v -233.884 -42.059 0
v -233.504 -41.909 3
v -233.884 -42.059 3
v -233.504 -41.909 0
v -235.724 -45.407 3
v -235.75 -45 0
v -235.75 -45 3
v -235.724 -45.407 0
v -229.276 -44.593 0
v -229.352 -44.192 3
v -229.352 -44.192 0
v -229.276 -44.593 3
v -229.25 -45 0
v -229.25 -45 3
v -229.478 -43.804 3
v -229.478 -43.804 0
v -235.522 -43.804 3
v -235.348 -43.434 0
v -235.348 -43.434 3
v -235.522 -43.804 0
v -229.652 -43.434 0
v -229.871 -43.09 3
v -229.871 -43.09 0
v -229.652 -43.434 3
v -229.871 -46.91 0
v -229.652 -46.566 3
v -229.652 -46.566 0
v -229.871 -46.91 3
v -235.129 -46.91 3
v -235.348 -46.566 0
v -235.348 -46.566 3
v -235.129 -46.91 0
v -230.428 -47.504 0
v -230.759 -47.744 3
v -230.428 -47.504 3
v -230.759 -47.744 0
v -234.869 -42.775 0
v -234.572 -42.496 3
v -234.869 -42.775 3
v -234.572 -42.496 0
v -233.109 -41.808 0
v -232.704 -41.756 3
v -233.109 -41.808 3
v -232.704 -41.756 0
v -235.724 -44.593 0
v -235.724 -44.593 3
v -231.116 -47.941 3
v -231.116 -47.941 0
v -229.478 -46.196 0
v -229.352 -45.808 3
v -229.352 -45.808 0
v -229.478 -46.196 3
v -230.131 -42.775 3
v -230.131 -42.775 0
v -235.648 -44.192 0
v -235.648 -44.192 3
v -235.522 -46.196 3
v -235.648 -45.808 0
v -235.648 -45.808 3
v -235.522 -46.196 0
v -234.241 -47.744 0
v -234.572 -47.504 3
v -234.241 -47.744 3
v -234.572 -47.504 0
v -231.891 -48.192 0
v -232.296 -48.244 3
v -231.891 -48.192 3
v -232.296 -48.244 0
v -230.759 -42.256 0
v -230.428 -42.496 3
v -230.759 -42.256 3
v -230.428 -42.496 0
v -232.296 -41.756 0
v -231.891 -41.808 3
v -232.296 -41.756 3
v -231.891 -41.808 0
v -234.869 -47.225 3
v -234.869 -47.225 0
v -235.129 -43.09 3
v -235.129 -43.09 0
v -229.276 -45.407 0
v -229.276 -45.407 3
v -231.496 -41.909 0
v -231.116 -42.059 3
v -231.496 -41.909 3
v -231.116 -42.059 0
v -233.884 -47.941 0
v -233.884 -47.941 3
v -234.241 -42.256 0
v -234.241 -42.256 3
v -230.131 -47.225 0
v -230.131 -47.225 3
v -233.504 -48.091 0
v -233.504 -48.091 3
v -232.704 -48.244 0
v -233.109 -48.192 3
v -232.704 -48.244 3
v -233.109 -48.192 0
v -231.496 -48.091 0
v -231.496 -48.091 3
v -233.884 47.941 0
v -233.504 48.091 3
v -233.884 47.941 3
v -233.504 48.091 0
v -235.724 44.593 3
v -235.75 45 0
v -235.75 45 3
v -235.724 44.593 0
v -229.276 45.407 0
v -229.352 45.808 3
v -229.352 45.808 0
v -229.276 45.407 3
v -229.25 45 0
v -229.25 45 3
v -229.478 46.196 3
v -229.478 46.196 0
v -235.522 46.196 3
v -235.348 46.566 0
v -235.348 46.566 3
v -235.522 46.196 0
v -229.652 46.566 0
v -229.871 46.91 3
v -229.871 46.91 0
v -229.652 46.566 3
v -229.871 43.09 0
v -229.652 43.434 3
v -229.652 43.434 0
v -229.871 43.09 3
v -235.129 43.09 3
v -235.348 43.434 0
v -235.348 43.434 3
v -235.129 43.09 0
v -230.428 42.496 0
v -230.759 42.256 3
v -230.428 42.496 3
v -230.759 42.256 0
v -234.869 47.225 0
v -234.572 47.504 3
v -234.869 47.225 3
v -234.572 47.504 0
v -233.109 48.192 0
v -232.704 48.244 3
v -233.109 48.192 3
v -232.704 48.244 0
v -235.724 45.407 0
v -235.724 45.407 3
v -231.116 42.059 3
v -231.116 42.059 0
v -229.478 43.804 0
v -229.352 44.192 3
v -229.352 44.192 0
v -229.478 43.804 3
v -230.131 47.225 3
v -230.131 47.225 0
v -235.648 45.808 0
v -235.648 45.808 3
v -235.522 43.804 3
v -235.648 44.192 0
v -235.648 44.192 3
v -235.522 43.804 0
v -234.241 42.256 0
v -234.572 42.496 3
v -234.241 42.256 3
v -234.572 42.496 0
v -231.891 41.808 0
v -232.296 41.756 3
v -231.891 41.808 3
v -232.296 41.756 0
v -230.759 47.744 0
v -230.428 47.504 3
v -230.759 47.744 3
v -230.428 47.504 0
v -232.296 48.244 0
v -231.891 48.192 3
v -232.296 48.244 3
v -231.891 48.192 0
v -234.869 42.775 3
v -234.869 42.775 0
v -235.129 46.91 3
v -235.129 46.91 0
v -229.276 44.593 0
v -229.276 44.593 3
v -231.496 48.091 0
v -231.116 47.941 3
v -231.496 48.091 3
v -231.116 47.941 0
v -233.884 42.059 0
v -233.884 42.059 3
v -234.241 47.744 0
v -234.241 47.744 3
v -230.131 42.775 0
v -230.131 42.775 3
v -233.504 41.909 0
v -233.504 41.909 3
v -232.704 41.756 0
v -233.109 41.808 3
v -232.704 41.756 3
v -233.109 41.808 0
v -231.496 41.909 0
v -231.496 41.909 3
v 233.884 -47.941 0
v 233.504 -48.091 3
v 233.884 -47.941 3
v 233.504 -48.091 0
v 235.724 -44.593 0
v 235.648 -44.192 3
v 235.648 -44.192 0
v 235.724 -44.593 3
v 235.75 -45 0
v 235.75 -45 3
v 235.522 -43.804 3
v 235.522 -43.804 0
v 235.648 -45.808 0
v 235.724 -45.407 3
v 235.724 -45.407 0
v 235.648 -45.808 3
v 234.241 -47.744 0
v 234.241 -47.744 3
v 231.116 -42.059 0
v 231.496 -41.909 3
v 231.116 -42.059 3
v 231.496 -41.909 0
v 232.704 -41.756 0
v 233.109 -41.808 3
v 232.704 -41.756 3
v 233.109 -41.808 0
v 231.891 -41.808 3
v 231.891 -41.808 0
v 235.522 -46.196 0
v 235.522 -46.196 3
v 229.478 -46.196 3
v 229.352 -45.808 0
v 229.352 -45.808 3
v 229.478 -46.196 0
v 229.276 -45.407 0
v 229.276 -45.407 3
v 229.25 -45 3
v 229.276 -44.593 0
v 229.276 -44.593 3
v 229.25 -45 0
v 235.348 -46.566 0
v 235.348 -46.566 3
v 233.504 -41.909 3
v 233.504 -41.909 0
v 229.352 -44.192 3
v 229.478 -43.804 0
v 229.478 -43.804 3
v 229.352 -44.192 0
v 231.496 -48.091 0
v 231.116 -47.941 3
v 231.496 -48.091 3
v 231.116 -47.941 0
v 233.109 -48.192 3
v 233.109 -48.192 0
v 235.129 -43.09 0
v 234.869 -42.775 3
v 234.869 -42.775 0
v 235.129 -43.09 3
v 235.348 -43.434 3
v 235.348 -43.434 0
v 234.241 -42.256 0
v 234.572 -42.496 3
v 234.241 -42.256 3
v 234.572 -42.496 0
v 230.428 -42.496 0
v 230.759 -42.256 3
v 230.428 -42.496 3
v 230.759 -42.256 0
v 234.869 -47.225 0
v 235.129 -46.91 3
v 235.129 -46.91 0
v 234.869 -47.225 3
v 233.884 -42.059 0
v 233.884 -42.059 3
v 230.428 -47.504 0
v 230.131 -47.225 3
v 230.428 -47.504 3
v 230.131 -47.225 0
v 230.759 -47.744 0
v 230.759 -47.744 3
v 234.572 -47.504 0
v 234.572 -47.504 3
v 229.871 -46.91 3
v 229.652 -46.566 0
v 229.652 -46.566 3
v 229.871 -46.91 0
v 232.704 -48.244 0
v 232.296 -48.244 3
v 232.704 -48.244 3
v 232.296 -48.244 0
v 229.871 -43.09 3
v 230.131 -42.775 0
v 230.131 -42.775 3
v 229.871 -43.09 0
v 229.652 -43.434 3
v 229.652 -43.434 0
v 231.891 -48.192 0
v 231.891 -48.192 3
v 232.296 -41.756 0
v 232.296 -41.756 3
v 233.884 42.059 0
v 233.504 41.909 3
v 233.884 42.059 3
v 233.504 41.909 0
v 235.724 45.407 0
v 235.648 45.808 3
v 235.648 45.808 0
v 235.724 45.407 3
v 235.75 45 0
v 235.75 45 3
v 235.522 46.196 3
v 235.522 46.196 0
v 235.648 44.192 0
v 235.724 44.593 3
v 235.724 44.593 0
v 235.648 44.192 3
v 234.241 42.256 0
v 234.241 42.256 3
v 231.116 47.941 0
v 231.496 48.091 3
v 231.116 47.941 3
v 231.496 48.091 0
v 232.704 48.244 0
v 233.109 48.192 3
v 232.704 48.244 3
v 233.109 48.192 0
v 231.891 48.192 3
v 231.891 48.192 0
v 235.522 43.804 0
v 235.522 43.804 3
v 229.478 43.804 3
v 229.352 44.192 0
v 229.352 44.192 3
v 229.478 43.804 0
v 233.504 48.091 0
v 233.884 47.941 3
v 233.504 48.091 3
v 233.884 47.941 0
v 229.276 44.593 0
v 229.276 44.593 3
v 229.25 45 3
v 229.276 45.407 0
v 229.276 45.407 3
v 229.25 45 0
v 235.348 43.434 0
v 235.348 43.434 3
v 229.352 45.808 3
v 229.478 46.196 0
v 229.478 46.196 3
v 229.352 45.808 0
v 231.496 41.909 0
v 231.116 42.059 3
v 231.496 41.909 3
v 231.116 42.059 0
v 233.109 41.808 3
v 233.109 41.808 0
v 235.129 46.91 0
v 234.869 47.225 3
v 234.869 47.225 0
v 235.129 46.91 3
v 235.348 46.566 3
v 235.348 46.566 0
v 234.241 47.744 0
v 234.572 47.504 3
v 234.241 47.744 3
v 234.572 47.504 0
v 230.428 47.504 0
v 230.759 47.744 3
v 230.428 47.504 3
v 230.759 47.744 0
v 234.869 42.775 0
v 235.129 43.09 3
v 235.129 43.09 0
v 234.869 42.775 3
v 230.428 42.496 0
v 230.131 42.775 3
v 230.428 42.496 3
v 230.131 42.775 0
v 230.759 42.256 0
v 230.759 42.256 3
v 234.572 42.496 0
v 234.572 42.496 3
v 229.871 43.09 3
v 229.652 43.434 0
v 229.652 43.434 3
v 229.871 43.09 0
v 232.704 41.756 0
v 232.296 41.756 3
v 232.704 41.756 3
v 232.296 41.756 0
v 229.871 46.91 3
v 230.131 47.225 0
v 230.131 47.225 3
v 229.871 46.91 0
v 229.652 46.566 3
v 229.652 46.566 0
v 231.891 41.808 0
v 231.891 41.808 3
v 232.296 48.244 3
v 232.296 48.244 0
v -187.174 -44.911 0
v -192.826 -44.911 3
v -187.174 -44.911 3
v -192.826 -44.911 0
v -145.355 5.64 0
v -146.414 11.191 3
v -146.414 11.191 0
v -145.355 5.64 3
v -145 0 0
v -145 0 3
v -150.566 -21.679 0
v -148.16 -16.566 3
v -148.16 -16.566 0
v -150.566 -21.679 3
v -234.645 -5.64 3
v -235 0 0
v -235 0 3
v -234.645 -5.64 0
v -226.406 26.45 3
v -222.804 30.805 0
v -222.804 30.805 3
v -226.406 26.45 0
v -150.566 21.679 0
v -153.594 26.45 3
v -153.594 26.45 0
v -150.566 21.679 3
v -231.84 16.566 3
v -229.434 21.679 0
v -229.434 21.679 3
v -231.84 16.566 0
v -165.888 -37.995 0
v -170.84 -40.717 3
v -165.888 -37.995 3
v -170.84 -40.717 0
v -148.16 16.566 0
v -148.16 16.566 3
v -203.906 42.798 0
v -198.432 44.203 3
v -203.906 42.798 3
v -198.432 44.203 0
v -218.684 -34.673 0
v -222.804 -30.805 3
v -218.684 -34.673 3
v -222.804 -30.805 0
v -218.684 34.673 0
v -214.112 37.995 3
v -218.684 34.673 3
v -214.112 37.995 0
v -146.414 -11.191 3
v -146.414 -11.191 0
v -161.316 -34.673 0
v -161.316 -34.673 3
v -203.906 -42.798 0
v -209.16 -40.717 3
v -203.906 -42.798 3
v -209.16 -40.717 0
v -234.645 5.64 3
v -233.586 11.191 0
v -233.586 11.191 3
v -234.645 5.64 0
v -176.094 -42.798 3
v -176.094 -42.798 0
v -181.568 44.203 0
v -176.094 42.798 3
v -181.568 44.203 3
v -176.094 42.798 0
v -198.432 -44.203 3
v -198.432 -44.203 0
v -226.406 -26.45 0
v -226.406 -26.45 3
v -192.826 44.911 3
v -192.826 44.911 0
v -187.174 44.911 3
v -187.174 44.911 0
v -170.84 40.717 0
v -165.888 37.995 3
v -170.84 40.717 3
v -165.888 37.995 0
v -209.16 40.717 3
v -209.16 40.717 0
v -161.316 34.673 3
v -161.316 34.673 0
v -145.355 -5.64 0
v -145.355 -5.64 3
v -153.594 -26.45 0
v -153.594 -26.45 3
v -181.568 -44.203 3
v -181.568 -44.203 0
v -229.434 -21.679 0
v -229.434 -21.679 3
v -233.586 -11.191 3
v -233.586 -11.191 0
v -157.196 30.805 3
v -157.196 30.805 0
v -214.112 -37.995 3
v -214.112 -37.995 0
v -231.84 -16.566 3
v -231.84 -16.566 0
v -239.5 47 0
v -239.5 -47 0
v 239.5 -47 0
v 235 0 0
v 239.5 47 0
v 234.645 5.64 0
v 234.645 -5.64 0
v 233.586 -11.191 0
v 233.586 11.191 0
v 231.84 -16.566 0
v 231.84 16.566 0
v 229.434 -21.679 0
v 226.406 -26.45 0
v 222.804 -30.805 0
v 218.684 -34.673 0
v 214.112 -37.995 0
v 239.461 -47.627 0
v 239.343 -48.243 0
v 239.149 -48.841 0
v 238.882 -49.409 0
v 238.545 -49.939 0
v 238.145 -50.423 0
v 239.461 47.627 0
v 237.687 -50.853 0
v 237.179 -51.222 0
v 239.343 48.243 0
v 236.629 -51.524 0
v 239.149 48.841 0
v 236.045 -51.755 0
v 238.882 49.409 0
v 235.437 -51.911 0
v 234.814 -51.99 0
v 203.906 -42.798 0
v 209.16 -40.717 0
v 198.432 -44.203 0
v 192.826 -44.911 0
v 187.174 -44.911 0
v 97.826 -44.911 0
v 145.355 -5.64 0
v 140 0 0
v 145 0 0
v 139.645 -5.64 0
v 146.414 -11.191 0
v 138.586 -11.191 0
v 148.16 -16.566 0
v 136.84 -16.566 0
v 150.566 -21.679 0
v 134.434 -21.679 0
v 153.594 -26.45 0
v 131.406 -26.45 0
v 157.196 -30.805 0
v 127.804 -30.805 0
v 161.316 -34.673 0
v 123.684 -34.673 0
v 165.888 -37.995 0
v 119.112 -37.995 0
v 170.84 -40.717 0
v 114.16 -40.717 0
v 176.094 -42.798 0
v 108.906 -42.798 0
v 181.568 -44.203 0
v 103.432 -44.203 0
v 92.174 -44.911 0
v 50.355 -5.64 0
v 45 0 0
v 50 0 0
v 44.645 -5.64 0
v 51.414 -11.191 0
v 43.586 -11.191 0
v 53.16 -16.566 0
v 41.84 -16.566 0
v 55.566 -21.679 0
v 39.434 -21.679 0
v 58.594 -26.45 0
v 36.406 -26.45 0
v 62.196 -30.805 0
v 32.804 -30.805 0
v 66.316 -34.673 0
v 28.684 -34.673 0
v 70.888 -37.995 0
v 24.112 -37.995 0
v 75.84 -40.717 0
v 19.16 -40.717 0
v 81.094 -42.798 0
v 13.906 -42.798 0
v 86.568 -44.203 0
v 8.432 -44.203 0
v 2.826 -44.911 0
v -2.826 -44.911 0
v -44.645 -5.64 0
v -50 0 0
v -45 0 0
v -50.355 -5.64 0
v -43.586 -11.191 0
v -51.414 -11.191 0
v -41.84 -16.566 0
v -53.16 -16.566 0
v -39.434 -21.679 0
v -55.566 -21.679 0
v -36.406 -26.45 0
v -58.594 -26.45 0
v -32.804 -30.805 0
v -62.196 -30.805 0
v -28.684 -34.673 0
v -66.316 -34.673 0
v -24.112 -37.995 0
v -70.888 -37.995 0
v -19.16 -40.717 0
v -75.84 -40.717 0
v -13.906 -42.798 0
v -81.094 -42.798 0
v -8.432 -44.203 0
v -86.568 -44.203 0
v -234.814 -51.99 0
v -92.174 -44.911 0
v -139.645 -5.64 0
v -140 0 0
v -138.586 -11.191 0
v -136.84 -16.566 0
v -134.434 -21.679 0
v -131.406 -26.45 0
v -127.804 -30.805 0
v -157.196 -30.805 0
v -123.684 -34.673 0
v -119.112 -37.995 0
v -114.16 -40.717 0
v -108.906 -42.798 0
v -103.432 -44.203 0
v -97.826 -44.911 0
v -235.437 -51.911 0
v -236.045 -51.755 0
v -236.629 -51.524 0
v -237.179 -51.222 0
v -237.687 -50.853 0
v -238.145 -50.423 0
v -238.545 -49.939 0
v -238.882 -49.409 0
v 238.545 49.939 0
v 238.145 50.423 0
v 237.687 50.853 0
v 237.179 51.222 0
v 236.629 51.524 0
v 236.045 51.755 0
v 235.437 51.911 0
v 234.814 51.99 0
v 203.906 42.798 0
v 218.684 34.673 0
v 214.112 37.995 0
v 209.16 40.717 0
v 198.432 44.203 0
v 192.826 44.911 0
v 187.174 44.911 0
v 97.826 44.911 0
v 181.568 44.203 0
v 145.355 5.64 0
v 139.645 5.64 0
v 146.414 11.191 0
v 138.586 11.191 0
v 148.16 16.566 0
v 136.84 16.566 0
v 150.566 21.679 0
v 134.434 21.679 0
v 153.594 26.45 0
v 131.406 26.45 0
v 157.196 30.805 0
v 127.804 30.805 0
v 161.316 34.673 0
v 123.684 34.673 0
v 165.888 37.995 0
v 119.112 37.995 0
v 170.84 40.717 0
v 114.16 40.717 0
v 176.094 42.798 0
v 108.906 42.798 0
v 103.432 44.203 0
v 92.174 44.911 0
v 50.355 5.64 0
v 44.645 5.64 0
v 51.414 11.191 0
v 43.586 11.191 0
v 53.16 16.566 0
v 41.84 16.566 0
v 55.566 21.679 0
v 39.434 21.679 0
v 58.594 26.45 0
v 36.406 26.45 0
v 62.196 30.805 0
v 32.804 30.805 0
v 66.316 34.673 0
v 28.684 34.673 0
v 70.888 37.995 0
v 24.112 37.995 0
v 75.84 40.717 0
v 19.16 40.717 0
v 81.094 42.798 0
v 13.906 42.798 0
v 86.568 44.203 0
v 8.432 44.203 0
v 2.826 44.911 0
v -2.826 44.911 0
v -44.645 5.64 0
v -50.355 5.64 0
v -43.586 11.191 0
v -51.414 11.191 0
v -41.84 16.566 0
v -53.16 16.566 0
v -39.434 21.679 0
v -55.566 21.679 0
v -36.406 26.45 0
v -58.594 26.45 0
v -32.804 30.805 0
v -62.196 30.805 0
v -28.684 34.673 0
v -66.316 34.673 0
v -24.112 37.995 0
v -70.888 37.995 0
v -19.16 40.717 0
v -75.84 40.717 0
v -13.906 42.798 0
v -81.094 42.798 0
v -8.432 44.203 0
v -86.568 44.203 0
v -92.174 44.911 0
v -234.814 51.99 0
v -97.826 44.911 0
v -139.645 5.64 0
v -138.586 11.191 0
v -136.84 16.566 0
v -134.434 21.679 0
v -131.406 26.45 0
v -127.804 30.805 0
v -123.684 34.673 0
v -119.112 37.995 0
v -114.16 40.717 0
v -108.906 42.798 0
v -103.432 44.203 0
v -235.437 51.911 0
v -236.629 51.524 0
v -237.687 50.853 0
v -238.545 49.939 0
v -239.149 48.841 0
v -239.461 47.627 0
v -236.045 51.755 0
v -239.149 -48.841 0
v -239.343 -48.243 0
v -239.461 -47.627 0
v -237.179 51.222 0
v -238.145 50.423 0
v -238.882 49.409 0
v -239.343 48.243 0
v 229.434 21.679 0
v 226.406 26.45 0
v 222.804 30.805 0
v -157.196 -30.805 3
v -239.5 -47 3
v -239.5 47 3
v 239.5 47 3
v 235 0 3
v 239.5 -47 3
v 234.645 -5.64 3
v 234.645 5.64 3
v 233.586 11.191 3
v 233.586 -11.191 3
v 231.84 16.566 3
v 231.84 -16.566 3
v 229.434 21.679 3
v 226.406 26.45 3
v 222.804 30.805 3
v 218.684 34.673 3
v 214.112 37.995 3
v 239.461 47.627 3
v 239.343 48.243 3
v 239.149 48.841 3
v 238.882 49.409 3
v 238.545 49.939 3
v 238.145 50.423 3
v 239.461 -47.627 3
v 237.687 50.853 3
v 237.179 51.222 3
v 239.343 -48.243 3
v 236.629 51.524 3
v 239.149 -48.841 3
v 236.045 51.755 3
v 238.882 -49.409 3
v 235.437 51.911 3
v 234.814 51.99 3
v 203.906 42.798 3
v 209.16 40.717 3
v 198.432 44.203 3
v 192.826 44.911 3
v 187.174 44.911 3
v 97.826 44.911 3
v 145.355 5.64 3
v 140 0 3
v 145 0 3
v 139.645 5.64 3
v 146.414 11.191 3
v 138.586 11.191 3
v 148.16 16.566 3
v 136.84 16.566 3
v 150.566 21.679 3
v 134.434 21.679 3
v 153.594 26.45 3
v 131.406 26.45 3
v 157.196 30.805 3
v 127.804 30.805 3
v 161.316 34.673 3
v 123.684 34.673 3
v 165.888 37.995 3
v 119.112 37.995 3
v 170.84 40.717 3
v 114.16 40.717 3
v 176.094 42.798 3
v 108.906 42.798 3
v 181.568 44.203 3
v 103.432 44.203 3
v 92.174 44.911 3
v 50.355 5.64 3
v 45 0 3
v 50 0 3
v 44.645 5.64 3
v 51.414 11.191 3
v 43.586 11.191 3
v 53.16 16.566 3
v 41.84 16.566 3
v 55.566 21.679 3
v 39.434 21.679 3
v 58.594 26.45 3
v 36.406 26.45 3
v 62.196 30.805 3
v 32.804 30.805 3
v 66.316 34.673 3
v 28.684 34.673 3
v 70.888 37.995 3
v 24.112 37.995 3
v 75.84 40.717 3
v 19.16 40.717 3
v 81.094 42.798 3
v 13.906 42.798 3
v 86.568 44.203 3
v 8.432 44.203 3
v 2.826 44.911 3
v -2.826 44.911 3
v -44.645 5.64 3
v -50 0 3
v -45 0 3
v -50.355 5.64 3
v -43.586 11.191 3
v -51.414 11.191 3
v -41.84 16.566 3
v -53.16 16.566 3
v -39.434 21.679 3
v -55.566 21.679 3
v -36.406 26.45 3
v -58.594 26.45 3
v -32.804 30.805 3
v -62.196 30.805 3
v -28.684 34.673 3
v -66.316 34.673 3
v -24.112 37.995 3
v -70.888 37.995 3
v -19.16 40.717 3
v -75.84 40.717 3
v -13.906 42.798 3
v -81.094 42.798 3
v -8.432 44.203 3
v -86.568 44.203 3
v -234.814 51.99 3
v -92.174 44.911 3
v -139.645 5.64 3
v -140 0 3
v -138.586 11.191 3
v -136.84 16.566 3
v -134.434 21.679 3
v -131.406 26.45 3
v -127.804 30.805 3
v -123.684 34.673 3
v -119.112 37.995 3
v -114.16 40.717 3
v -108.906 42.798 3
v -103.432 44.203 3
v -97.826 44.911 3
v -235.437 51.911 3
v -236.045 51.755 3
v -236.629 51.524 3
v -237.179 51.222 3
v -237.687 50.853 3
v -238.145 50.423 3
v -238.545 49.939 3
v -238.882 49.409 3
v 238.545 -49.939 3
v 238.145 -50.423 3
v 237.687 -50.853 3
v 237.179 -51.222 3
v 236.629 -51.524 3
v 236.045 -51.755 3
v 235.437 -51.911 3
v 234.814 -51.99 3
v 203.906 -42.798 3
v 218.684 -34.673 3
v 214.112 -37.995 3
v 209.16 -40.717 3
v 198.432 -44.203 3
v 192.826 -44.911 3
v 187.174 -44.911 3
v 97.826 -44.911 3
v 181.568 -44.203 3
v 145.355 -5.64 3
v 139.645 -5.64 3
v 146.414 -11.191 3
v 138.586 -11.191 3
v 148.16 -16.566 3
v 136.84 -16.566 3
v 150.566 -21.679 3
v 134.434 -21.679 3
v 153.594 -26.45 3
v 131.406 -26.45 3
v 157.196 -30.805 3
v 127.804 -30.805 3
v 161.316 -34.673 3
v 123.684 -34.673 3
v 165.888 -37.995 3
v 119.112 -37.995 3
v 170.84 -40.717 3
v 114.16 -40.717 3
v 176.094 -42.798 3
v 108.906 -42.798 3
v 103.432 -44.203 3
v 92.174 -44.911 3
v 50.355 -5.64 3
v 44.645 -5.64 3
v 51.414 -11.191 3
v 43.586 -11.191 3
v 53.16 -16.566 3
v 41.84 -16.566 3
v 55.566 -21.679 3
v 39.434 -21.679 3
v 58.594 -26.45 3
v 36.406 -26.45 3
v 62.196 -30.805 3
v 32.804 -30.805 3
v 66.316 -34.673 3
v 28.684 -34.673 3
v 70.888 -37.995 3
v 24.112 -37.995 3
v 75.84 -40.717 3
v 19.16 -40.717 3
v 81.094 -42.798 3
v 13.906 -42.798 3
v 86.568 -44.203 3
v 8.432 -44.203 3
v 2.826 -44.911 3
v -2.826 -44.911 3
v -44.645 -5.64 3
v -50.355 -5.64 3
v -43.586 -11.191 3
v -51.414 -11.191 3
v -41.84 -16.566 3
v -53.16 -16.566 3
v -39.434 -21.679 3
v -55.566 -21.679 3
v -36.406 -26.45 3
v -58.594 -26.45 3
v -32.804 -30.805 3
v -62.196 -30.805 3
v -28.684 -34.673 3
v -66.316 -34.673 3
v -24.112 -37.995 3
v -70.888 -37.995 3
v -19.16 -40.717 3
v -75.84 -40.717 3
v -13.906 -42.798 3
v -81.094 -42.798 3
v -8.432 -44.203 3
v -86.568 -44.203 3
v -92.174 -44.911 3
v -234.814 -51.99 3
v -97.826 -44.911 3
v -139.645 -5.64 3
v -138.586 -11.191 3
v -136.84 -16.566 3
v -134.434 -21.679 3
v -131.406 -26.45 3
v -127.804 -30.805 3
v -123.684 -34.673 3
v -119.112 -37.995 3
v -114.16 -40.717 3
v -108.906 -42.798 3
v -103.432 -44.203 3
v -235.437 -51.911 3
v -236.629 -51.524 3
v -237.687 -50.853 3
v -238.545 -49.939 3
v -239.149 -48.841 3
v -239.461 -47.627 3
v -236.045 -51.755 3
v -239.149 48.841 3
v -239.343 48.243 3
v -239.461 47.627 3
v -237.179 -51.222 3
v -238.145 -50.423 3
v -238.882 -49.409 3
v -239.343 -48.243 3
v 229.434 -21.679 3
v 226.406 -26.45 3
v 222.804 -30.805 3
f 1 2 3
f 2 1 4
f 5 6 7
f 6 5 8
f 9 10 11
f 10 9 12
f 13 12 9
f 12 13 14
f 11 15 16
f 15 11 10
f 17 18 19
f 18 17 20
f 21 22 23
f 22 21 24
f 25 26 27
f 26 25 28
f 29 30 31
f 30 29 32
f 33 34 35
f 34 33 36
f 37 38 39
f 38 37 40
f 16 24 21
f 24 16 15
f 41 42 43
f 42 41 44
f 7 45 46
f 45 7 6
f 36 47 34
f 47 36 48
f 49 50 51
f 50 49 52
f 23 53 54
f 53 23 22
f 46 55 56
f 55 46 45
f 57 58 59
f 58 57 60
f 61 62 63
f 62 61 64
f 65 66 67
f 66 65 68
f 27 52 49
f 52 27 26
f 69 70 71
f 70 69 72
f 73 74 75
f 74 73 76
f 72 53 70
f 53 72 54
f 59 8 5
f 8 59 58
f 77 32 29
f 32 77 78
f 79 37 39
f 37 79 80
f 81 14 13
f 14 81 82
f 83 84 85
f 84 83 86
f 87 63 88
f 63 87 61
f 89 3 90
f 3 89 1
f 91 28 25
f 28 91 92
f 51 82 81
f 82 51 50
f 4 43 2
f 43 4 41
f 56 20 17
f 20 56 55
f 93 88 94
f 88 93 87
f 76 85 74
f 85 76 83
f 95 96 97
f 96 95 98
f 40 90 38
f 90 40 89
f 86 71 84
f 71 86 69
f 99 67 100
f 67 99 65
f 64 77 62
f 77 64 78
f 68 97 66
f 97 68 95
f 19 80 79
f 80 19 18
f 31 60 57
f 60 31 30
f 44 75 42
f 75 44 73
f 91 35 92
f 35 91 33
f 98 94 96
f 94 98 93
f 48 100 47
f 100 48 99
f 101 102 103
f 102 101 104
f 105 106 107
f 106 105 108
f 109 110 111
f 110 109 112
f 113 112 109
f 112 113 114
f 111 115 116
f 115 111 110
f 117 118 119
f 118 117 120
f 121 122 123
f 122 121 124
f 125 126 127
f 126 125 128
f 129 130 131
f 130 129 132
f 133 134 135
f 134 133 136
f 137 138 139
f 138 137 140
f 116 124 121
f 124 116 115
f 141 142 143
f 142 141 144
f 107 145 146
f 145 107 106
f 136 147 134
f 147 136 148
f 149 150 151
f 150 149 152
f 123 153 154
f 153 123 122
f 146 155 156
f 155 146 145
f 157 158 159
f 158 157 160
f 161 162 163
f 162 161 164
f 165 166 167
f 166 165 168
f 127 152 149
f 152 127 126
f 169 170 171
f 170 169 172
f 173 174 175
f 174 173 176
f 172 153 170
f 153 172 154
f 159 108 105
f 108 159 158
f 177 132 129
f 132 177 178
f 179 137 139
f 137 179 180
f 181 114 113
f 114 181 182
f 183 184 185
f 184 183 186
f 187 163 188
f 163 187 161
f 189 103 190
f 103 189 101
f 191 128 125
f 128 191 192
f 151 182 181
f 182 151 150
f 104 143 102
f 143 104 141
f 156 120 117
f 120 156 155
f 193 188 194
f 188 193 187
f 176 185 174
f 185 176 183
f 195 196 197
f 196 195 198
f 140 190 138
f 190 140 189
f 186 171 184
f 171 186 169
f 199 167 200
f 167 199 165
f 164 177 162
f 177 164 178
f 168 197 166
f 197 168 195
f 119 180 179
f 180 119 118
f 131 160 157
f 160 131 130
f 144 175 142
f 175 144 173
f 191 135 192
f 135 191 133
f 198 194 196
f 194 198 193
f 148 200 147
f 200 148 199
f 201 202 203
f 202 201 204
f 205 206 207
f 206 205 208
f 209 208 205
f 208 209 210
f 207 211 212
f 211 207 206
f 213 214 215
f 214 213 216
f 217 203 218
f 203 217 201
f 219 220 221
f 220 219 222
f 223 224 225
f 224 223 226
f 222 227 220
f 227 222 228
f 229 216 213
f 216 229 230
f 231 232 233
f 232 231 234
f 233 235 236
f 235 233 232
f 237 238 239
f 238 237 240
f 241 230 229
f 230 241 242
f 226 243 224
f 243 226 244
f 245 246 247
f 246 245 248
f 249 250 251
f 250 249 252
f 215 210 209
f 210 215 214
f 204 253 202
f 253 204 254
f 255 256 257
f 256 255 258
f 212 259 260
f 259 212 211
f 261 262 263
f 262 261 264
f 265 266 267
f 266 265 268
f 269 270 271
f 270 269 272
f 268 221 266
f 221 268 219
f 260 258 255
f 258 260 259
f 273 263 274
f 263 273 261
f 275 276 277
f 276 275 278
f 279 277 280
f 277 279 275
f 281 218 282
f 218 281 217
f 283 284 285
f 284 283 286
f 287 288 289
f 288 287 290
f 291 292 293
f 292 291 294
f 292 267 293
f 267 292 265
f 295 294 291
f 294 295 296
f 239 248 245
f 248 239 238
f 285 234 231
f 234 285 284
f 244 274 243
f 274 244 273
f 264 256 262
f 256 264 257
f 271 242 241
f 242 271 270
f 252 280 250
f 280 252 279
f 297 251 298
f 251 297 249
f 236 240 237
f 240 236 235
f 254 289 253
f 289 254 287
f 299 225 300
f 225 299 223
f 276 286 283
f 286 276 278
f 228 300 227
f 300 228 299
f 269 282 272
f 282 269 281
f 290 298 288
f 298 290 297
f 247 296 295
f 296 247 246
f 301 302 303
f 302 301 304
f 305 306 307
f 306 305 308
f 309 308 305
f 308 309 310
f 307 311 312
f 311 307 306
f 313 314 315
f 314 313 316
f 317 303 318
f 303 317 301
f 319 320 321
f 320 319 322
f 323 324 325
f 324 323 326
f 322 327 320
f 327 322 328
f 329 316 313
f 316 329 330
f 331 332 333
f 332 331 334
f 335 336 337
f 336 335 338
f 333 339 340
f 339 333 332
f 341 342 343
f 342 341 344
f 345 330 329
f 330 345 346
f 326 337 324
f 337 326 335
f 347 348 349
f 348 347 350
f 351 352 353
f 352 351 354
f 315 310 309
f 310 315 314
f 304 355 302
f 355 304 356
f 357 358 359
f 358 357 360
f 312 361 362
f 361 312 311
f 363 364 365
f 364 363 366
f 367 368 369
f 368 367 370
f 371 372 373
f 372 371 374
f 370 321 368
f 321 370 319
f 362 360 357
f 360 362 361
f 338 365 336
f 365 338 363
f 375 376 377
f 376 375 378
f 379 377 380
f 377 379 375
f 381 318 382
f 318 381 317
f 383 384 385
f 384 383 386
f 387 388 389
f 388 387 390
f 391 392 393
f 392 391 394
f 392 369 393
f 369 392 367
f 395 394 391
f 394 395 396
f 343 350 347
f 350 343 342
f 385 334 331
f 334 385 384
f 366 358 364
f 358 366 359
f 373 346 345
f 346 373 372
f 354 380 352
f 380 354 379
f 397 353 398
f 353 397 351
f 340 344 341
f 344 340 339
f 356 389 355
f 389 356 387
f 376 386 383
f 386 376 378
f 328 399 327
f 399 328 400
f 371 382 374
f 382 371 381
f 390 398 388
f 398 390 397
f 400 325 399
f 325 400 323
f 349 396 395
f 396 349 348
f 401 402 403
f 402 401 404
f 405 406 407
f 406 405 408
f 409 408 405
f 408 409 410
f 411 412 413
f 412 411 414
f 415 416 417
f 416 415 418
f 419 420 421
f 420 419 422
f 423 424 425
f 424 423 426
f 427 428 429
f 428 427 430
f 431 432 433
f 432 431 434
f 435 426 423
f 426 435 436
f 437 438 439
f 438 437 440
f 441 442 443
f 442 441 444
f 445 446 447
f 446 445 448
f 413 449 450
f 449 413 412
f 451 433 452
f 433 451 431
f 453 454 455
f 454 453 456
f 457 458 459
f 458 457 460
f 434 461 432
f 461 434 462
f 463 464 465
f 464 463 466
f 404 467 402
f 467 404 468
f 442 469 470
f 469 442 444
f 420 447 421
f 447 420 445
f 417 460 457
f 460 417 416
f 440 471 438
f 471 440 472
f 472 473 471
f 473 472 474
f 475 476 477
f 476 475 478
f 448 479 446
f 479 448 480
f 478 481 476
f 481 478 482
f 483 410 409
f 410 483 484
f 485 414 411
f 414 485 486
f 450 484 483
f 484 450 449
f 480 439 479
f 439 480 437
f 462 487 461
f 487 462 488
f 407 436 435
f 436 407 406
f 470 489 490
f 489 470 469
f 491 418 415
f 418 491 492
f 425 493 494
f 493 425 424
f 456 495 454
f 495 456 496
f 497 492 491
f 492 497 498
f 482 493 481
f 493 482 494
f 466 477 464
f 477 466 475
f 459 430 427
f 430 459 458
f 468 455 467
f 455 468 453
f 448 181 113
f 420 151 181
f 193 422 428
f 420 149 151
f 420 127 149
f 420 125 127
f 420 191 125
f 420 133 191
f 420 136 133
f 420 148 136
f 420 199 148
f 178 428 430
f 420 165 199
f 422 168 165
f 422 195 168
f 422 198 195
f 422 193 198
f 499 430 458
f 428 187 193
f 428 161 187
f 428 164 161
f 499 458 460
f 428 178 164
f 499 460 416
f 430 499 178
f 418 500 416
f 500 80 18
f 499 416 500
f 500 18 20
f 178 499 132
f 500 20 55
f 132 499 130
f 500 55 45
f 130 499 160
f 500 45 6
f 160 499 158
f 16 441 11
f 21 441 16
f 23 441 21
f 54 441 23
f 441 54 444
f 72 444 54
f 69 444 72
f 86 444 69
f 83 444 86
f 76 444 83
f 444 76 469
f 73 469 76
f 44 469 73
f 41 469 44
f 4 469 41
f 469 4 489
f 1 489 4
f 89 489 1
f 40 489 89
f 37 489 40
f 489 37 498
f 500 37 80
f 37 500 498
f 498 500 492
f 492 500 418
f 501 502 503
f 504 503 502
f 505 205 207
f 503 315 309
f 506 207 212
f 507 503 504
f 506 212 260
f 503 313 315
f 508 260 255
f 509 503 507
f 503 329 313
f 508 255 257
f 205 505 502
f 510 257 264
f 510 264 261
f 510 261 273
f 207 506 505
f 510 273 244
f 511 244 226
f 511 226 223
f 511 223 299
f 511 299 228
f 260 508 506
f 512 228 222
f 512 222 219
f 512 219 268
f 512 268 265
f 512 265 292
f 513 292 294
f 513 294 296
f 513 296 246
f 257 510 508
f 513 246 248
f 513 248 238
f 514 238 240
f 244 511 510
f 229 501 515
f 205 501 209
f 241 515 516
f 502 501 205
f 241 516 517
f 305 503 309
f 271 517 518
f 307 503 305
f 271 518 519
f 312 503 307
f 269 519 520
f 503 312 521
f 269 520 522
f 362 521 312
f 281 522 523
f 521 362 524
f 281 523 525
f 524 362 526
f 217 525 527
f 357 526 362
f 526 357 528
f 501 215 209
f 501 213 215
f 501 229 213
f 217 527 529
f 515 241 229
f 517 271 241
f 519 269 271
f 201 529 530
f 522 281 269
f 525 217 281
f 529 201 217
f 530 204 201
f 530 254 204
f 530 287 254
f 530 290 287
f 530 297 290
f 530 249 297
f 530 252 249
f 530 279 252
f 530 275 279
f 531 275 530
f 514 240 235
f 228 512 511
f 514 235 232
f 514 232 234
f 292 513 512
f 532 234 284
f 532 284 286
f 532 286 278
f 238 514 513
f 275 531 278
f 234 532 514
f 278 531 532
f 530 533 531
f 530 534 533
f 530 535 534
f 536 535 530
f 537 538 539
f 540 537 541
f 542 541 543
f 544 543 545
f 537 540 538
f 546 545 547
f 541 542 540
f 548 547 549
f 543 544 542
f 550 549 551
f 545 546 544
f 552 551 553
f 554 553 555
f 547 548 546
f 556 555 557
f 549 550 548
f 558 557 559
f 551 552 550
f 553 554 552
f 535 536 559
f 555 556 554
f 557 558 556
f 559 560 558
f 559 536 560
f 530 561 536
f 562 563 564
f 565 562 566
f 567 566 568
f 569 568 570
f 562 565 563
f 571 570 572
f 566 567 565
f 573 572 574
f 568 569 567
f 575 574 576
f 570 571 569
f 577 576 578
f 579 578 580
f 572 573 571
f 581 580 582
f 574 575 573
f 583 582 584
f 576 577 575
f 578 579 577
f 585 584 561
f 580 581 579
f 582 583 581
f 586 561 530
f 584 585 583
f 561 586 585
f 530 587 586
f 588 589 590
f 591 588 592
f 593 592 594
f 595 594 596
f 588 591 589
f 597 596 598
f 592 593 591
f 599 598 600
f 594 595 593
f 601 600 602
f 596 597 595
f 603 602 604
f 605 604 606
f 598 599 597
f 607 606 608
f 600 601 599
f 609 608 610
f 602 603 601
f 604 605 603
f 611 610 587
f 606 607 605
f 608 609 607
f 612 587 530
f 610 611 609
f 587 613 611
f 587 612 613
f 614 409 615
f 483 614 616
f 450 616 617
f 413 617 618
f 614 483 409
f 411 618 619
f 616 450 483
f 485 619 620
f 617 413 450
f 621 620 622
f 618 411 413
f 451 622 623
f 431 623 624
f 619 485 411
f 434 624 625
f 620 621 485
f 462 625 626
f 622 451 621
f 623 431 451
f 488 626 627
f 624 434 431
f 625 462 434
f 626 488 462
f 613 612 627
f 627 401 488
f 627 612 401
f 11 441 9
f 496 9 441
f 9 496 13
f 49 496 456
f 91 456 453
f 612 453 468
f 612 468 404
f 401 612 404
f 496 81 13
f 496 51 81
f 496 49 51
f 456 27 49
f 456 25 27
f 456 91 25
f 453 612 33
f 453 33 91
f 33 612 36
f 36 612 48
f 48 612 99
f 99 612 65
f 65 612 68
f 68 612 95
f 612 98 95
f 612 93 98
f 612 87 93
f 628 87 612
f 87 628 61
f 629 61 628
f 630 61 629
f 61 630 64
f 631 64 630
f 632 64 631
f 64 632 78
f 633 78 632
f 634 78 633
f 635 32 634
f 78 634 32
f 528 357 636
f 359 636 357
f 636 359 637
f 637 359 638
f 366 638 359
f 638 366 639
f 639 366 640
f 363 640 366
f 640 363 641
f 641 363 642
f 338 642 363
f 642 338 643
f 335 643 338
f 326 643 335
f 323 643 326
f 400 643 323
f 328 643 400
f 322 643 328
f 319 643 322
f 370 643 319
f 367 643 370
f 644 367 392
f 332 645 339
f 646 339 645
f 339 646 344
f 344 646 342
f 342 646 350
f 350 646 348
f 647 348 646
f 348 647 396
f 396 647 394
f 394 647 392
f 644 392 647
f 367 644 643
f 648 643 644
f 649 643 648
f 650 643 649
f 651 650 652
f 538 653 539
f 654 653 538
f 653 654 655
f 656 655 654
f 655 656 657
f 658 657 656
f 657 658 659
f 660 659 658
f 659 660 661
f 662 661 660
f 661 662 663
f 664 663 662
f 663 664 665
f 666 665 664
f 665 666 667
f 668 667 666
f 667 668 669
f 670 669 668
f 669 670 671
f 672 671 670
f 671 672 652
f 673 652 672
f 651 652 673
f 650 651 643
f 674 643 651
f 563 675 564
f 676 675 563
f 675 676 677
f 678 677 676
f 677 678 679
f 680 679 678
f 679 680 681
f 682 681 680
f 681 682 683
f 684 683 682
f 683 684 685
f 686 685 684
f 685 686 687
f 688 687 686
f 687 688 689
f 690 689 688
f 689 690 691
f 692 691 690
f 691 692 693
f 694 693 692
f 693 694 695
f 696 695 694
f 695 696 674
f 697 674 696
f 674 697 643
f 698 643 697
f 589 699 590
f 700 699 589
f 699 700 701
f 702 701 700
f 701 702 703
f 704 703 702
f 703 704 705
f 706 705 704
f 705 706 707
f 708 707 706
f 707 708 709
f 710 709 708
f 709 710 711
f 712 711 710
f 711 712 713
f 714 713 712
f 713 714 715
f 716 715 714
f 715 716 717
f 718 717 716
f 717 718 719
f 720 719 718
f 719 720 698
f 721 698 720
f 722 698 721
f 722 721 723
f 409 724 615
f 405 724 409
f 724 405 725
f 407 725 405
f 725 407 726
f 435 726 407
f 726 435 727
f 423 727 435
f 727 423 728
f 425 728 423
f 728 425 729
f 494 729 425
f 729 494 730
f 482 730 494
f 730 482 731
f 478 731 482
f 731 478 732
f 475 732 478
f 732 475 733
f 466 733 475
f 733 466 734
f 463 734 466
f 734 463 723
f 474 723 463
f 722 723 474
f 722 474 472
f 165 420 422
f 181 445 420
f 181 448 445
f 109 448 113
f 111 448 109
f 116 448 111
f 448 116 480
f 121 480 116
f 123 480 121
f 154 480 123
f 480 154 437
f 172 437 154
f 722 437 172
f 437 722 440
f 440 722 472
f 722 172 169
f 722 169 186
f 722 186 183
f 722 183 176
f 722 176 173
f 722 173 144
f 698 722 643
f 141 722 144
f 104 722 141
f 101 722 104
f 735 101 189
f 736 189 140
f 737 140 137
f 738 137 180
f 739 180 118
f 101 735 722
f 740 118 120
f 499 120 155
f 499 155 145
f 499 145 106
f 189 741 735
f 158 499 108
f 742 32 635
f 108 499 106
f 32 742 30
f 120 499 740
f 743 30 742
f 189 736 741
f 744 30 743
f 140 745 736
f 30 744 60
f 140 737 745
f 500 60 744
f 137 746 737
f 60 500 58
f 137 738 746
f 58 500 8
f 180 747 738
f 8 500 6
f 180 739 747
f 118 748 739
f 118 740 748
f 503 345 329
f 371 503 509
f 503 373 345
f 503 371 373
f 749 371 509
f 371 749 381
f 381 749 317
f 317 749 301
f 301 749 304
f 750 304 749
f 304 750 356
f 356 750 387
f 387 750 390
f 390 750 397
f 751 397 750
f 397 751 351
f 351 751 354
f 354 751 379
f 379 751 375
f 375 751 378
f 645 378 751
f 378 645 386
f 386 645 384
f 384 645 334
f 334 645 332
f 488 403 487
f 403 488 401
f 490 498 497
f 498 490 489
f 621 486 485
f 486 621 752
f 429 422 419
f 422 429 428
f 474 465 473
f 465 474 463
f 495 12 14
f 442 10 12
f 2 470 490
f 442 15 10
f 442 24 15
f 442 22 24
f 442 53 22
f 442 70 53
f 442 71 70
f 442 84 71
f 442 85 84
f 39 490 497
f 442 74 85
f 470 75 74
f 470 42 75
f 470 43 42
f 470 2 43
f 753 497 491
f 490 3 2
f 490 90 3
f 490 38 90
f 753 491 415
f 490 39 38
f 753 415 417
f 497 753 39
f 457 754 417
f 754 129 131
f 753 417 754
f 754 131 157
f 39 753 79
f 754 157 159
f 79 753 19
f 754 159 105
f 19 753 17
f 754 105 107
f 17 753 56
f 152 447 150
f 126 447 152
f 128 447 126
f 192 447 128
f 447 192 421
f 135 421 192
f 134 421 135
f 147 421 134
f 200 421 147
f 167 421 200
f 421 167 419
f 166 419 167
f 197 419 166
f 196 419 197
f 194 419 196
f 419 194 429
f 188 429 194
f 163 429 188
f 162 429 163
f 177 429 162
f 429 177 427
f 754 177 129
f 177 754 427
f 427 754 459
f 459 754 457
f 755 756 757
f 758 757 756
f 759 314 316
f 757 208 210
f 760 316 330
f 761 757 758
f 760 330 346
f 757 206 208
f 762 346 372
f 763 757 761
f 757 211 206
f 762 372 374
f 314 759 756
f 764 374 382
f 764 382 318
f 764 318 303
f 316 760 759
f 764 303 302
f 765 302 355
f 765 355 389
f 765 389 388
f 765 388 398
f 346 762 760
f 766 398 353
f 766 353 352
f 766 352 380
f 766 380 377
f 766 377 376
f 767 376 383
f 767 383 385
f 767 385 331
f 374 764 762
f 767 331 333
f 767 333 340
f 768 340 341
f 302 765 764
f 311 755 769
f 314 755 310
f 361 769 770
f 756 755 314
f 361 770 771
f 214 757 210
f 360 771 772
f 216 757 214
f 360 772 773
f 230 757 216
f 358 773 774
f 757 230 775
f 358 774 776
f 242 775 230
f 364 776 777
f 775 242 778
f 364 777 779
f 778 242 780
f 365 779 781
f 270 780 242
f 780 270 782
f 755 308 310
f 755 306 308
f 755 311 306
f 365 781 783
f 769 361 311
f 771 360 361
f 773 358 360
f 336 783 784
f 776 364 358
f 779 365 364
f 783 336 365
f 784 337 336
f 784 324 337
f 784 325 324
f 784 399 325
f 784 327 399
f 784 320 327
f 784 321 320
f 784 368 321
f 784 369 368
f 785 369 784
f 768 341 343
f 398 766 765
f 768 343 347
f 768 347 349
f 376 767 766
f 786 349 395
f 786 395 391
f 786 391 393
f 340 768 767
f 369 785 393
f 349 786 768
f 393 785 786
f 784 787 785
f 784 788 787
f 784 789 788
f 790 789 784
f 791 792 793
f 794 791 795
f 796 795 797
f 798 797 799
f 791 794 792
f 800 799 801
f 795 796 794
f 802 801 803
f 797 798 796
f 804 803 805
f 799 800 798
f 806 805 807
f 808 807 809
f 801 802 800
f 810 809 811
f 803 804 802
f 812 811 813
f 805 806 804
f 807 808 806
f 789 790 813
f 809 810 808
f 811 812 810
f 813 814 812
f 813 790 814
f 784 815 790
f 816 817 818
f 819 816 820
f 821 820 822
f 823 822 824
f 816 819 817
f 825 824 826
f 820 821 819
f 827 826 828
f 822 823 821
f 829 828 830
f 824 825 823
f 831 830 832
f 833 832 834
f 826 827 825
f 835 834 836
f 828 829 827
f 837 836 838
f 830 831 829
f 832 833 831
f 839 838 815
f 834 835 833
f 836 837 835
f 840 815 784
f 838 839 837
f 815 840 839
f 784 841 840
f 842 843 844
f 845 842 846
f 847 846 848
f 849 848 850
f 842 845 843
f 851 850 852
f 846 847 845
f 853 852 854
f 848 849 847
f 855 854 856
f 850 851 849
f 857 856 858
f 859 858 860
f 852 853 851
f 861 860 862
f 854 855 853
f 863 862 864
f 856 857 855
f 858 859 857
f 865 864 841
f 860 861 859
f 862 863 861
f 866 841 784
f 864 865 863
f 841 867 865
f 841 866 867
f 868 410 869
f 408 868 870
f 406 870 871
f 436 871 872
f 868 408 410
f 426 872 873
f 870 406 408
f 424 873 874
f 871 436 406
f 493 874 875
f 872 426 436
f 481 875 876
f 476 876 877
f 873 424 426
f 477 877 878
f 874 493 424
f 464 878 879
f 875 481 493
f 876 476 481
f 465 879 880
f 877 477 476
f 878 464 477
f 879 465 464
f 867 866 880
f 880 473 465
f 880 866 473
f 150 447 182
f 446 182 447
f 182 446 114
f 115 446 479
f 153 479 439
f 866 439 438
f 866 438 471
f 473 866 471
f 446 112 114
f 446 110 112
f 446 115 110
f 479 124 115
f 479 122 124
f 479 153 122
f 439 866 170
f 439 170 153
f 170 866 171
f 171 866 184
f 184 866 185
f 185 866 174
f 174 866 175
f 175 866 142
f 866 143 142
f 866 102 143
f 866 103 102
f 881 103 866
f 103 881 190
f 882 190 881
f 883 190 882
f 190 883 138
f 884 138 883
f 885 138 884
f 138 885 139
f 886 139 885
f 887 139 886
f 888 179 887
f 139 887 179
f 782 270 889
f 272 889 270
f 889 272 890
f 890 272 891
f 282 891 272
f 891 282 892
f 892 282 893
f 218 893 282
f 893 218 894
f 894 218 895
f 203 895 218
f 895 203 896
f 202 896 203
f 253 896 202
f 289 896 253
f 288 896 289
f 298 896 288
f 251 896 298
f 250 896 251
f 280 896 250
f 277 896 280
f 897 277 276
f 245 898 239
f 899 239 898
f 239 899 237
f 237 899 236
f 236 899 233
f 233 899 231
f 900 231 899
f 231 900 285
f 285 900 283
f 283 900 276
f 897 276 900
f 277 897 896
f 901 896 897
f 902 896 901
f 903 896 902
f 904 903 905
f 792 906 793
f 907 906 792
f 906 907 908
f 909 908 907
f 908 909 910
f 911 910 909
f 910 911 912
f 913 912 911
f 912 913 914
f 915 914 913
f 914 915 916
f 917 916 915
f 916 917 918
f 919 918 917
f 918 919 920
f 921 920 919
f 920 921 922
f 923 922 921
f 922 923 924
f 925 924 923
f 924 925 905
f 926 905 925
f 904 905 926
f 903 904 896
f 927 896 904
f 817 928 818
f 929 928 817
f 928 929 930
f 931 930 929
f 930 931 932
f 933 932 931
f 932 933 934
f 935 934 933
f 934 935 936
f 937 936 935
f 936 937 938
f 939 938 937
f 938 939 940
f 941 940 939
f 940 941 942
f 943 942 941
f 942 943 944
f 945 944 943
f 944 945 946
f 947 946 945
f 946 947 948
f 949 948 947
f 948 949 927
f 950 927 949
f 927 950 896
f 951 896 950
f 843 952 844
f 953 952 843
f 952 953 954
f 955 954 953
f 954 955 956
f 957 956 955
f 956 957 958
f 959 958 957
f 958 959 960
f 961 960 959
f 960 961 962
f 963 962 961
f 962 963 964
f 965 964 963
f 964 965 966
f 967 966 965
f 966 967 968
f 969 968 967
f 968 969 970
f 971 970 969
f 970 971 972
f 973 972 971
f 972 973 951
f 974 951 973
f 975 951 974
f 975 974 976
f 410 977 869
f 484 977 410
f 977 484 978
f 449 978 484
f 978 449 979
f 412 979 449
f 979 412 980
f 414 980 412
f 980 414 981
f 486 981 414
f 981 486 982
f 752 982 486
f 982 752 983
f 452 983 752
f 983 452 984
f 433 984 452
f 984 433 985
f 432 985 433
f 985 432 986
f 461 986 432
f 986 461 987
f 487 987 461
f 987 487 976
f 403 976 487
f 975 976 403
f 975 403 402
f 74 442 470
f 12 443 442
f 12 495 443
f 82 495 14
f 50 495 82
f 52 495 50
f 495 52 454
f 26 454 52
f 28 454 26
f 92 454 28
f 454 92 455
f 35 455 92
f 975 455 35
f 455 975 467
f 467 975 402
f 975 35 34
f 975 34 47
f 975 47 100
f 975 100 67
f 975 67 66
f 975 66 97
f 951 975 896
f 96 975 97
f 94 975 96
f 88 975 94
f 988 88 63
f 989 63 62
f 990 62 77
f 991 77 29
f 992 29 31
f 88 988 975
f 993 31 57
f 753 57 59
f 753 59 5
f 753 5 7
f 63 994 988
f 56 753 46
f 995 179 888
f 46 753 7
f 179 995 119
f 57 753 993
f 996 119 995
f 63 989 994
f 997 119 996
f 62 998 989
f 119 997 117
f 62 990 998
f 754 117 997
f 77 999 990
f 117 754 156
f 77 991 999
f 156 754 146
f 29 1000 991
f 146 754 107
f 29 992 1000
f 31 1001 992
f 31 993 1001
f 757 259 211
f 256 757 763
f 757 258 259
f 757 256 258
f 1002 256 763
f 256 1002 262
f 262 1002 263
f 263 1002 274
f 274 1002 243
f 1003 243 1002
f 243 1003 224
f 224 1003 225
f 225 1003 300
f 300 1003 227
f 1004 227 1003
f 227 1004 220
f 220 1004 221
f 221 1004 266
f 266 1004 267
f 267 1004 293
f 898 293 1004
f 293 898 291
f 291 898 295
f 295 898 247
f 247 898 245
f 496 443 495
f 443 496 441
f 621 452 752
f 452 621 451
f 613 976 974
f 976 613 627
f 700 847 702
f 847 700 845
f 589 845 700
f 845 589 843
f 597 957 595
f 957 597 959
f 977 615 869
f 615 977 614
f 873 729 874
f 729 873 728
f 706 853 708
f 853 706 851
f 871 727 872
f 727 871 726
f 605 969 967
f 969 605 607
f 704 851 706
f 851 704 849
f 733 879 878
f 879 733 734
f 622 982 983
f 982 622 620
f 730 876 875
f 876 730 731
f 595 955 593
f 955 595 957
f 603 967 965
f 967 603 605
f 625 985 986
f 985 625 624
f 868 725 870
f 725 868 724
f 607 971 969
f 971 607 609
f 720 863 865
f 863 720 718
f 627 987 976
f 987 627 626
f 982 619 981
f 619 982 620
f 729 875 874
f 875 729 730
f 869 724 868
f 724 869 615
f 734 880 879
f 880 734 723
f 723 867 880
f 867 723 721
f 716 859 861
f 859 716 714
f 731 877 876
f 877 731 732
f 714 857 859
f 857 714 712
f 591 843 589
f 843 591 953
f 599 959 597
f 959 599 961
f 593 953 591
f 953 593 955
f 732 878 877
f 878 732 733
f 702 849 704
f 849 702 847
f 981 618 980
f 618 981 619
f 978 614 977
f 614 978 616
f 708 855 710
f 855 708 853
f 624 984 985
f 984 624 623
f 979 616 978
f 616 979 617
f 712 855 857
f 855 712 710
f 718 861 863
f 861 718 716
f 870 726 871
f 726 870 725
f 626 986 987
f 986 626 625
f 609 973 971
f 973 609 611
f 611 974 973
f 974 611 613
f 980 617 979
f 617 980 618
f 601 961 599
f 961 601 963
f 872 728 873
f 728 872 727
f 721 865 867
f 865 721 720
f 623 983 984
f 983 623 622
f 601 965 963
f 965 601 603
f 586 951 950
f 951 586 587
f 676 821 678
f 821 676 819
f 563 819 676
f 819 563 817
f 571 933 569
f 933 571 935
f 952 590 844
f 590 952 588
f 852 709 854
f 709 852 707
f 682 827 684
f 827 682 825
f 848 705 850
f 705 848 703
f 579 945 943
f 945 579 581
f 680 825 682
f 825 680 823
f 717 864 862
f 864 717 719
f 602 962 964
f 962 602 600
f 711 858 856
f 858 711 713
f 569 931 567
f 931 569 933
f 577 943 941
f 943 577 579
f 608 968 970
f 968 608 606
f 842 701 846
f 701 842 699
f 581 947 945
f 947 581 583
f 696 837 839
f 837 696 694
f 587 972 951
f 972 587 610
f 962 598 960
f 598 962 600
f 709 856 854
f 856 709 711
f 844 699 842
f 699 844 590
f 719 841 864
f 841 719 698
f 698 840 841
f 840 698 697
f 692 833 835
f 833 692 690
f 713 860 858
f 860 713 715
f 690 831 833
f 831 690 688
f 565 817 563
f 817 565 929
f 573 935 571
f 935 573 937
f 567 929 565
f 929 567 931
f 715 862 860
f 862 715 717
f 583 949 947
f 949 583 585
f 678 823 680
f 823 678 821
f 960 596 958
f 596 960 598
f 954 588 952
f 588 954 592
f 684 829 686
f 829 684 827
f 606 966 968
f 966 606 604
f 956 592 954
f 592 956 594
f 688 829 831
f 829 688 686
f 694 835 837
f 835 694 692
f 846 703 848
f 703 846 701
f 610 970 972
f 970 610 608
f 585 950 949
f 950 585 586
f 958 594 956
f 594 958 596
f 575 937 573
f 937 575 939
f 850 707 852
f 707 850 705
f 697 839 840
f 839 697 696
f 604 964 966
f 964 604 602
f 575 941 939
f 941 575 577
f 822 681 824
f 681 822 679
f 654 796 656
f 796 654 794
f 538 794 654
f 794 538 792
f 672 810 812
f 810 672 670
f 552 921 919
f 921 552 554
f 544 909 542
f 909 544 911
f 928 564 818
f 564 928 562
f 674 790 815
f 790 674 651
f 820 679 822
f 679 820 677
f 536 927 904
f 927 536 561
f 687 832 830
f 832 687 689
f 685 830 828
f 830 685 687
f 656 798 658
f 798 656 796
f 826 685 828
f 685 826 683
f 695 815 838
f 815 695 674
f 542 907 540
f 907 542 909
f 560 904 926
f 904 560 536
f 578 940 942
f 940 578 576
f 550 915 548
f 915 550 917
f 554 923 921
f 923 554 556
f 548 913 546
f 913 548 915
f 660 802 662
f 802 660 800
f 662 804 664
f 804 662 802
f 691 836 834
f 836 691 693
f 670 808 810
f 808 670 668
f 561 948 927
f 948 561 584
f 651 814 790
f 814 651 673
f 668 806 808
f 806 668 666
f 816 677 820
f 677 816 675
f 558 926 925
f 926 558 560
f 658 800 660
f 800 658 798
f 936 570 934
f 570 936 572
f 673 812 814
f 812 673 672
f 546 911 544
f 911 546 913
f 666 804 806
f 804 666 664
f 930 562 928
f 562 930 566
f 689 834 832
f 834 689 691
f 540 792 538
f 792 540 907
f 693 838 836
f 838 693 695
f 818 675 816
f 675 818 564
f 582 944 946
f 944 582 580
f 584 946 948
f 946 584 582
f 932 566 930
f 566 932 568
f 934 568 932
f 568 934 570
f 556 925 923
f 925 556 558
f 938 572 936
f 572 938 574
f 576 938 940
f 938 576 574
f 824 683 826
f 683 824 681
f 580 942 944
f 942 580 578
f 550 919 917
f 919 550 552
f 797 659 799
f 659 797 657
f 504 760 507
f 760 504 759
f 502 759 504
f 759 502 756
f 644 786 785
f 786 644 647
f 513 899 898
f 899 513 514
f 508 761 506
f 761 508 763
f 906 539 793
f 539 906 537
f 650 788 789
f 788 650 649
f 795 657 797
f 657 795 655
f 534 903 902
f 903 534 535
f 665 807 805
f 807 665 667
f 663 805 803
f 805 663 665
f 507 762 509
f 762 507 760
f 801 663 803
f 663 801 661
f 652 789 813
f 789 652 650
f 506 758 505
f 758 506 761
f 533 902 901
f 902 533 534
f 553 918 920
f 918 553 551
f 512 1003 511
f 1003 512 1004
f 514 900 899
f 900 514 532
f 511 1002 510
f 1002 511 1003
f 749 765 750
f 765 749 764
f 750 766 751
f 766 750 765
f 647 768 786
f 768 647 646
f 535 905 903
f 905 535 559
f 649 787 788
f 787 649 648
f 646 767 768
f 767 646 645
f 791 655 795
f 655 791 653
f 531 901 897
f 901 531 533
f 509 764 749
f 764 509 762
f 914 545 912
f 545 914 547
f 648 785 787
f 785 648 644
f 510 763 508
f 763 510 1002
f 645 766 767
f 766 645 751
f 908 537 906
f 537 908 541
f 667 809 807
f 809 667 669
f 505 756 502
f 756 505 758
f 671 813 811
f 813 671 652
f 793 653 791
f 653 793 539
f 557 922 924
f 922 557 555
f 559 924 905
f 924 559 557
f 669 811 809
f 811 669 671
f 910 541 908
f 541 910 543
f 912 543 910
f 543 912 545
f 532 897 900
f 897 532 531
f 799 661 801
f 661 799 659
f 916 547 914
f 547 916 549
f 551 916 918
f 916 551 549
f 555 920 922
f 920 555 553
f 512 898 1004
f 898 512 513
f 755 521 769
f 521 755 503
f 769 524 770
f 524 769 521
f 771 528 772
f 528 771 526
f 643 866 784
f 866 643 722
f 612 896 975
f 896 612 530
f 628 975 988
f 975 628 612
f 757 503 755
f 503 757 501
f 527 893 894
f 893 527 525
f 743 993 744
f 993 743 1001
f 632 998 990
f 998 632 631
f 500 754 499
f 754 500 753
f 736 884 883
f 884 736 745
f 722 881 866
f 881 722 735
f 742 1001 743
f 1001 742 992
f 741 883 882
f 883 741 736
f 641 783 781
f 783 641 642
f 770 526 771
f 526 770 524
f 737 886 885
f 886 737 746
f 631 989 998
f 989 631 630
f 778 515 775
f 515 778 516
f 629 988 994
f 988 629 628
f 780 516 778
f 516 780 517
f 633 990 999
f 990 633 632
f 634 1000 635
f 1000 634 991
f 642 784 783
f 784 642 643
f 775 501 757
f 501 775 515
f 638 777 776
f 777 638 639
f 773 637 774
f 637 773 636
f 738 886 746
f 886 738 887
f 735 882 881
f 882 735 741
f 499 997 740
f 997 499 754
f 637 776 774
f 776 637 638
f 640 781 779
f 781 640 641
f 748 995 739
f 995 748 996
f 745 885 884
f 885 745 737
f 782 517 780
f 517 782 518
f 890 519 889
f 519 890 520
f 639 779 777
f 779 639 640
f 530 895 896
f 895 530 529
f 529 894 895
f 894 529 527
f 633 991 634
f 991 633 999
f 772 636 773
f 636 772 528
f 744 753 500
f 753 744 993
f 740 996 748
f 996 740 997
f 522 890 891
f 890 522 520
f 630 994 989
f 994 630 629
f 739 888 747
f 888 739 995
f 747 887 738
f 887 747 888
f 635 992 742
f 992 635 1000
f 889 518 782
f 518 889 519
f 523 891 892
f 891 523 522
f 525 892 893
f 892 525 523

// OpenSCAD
$fn = 50;


difference() {
	union() {
		hull() {
			translate(v = [-234.5000000000, 47.0000000000, 0]) {
				cylinder(h = 3, r = 5);
			}
			translate(v = [234.5000000000, 47.0000000000, 0]) {
				cylinder(h = 3, r = 5);
			}
			translate(v = [-234.5000000000, -47.0000000000, 0]) {
				cylinder(h = 3, r = 5);
			}
			translate(v = [234.5000000000, -47.0000000000, 0]) {
				cylinder(h = 3, r = 5);
			}
		}
	}
	union() {
		#translate(v = [-232.5000000000, -45.0000000000, -100.0000000000]) {
			cylinder(h = 200, r = 3.2500000000);
		}
		#translate(v = [-232.5000000000, 45.0000000000, -100.0000000000]) {
			cylinder(h = 200, r = 3.2500000000);
		}
		#translate(v = [232.5000000000, -45.0000000000, -100.0000000000]) {
			cylinder(h = 200, r = 3.2500000000);
		}
		#translate(v = [232.5000000000, 45.0000000000, -100.0000000000]) {
			cylinder(h = 200, r = 3.2500000000);
		}
		#translate(v = [-190.0000000000, 0, 0]) {
			cylinder(h = 3, r = 45.0000000000);
		}
		#translate(v = [-95.0000000000, 0, 0]) {
			cylinder(h = 3, r = 45.0000000000);
		}
		#cylinder(h = 3, r = 45.0000000000);
		#translate(v = [95.0000000000, 0, 0]) {
			cylinder(h = 3, r = 45.0000000000);
		}
		#translate(v = [190.0000000000, 0, 0]) {
			cylinder(h = 3, r = 45.0000000000);
		}
	}
}
